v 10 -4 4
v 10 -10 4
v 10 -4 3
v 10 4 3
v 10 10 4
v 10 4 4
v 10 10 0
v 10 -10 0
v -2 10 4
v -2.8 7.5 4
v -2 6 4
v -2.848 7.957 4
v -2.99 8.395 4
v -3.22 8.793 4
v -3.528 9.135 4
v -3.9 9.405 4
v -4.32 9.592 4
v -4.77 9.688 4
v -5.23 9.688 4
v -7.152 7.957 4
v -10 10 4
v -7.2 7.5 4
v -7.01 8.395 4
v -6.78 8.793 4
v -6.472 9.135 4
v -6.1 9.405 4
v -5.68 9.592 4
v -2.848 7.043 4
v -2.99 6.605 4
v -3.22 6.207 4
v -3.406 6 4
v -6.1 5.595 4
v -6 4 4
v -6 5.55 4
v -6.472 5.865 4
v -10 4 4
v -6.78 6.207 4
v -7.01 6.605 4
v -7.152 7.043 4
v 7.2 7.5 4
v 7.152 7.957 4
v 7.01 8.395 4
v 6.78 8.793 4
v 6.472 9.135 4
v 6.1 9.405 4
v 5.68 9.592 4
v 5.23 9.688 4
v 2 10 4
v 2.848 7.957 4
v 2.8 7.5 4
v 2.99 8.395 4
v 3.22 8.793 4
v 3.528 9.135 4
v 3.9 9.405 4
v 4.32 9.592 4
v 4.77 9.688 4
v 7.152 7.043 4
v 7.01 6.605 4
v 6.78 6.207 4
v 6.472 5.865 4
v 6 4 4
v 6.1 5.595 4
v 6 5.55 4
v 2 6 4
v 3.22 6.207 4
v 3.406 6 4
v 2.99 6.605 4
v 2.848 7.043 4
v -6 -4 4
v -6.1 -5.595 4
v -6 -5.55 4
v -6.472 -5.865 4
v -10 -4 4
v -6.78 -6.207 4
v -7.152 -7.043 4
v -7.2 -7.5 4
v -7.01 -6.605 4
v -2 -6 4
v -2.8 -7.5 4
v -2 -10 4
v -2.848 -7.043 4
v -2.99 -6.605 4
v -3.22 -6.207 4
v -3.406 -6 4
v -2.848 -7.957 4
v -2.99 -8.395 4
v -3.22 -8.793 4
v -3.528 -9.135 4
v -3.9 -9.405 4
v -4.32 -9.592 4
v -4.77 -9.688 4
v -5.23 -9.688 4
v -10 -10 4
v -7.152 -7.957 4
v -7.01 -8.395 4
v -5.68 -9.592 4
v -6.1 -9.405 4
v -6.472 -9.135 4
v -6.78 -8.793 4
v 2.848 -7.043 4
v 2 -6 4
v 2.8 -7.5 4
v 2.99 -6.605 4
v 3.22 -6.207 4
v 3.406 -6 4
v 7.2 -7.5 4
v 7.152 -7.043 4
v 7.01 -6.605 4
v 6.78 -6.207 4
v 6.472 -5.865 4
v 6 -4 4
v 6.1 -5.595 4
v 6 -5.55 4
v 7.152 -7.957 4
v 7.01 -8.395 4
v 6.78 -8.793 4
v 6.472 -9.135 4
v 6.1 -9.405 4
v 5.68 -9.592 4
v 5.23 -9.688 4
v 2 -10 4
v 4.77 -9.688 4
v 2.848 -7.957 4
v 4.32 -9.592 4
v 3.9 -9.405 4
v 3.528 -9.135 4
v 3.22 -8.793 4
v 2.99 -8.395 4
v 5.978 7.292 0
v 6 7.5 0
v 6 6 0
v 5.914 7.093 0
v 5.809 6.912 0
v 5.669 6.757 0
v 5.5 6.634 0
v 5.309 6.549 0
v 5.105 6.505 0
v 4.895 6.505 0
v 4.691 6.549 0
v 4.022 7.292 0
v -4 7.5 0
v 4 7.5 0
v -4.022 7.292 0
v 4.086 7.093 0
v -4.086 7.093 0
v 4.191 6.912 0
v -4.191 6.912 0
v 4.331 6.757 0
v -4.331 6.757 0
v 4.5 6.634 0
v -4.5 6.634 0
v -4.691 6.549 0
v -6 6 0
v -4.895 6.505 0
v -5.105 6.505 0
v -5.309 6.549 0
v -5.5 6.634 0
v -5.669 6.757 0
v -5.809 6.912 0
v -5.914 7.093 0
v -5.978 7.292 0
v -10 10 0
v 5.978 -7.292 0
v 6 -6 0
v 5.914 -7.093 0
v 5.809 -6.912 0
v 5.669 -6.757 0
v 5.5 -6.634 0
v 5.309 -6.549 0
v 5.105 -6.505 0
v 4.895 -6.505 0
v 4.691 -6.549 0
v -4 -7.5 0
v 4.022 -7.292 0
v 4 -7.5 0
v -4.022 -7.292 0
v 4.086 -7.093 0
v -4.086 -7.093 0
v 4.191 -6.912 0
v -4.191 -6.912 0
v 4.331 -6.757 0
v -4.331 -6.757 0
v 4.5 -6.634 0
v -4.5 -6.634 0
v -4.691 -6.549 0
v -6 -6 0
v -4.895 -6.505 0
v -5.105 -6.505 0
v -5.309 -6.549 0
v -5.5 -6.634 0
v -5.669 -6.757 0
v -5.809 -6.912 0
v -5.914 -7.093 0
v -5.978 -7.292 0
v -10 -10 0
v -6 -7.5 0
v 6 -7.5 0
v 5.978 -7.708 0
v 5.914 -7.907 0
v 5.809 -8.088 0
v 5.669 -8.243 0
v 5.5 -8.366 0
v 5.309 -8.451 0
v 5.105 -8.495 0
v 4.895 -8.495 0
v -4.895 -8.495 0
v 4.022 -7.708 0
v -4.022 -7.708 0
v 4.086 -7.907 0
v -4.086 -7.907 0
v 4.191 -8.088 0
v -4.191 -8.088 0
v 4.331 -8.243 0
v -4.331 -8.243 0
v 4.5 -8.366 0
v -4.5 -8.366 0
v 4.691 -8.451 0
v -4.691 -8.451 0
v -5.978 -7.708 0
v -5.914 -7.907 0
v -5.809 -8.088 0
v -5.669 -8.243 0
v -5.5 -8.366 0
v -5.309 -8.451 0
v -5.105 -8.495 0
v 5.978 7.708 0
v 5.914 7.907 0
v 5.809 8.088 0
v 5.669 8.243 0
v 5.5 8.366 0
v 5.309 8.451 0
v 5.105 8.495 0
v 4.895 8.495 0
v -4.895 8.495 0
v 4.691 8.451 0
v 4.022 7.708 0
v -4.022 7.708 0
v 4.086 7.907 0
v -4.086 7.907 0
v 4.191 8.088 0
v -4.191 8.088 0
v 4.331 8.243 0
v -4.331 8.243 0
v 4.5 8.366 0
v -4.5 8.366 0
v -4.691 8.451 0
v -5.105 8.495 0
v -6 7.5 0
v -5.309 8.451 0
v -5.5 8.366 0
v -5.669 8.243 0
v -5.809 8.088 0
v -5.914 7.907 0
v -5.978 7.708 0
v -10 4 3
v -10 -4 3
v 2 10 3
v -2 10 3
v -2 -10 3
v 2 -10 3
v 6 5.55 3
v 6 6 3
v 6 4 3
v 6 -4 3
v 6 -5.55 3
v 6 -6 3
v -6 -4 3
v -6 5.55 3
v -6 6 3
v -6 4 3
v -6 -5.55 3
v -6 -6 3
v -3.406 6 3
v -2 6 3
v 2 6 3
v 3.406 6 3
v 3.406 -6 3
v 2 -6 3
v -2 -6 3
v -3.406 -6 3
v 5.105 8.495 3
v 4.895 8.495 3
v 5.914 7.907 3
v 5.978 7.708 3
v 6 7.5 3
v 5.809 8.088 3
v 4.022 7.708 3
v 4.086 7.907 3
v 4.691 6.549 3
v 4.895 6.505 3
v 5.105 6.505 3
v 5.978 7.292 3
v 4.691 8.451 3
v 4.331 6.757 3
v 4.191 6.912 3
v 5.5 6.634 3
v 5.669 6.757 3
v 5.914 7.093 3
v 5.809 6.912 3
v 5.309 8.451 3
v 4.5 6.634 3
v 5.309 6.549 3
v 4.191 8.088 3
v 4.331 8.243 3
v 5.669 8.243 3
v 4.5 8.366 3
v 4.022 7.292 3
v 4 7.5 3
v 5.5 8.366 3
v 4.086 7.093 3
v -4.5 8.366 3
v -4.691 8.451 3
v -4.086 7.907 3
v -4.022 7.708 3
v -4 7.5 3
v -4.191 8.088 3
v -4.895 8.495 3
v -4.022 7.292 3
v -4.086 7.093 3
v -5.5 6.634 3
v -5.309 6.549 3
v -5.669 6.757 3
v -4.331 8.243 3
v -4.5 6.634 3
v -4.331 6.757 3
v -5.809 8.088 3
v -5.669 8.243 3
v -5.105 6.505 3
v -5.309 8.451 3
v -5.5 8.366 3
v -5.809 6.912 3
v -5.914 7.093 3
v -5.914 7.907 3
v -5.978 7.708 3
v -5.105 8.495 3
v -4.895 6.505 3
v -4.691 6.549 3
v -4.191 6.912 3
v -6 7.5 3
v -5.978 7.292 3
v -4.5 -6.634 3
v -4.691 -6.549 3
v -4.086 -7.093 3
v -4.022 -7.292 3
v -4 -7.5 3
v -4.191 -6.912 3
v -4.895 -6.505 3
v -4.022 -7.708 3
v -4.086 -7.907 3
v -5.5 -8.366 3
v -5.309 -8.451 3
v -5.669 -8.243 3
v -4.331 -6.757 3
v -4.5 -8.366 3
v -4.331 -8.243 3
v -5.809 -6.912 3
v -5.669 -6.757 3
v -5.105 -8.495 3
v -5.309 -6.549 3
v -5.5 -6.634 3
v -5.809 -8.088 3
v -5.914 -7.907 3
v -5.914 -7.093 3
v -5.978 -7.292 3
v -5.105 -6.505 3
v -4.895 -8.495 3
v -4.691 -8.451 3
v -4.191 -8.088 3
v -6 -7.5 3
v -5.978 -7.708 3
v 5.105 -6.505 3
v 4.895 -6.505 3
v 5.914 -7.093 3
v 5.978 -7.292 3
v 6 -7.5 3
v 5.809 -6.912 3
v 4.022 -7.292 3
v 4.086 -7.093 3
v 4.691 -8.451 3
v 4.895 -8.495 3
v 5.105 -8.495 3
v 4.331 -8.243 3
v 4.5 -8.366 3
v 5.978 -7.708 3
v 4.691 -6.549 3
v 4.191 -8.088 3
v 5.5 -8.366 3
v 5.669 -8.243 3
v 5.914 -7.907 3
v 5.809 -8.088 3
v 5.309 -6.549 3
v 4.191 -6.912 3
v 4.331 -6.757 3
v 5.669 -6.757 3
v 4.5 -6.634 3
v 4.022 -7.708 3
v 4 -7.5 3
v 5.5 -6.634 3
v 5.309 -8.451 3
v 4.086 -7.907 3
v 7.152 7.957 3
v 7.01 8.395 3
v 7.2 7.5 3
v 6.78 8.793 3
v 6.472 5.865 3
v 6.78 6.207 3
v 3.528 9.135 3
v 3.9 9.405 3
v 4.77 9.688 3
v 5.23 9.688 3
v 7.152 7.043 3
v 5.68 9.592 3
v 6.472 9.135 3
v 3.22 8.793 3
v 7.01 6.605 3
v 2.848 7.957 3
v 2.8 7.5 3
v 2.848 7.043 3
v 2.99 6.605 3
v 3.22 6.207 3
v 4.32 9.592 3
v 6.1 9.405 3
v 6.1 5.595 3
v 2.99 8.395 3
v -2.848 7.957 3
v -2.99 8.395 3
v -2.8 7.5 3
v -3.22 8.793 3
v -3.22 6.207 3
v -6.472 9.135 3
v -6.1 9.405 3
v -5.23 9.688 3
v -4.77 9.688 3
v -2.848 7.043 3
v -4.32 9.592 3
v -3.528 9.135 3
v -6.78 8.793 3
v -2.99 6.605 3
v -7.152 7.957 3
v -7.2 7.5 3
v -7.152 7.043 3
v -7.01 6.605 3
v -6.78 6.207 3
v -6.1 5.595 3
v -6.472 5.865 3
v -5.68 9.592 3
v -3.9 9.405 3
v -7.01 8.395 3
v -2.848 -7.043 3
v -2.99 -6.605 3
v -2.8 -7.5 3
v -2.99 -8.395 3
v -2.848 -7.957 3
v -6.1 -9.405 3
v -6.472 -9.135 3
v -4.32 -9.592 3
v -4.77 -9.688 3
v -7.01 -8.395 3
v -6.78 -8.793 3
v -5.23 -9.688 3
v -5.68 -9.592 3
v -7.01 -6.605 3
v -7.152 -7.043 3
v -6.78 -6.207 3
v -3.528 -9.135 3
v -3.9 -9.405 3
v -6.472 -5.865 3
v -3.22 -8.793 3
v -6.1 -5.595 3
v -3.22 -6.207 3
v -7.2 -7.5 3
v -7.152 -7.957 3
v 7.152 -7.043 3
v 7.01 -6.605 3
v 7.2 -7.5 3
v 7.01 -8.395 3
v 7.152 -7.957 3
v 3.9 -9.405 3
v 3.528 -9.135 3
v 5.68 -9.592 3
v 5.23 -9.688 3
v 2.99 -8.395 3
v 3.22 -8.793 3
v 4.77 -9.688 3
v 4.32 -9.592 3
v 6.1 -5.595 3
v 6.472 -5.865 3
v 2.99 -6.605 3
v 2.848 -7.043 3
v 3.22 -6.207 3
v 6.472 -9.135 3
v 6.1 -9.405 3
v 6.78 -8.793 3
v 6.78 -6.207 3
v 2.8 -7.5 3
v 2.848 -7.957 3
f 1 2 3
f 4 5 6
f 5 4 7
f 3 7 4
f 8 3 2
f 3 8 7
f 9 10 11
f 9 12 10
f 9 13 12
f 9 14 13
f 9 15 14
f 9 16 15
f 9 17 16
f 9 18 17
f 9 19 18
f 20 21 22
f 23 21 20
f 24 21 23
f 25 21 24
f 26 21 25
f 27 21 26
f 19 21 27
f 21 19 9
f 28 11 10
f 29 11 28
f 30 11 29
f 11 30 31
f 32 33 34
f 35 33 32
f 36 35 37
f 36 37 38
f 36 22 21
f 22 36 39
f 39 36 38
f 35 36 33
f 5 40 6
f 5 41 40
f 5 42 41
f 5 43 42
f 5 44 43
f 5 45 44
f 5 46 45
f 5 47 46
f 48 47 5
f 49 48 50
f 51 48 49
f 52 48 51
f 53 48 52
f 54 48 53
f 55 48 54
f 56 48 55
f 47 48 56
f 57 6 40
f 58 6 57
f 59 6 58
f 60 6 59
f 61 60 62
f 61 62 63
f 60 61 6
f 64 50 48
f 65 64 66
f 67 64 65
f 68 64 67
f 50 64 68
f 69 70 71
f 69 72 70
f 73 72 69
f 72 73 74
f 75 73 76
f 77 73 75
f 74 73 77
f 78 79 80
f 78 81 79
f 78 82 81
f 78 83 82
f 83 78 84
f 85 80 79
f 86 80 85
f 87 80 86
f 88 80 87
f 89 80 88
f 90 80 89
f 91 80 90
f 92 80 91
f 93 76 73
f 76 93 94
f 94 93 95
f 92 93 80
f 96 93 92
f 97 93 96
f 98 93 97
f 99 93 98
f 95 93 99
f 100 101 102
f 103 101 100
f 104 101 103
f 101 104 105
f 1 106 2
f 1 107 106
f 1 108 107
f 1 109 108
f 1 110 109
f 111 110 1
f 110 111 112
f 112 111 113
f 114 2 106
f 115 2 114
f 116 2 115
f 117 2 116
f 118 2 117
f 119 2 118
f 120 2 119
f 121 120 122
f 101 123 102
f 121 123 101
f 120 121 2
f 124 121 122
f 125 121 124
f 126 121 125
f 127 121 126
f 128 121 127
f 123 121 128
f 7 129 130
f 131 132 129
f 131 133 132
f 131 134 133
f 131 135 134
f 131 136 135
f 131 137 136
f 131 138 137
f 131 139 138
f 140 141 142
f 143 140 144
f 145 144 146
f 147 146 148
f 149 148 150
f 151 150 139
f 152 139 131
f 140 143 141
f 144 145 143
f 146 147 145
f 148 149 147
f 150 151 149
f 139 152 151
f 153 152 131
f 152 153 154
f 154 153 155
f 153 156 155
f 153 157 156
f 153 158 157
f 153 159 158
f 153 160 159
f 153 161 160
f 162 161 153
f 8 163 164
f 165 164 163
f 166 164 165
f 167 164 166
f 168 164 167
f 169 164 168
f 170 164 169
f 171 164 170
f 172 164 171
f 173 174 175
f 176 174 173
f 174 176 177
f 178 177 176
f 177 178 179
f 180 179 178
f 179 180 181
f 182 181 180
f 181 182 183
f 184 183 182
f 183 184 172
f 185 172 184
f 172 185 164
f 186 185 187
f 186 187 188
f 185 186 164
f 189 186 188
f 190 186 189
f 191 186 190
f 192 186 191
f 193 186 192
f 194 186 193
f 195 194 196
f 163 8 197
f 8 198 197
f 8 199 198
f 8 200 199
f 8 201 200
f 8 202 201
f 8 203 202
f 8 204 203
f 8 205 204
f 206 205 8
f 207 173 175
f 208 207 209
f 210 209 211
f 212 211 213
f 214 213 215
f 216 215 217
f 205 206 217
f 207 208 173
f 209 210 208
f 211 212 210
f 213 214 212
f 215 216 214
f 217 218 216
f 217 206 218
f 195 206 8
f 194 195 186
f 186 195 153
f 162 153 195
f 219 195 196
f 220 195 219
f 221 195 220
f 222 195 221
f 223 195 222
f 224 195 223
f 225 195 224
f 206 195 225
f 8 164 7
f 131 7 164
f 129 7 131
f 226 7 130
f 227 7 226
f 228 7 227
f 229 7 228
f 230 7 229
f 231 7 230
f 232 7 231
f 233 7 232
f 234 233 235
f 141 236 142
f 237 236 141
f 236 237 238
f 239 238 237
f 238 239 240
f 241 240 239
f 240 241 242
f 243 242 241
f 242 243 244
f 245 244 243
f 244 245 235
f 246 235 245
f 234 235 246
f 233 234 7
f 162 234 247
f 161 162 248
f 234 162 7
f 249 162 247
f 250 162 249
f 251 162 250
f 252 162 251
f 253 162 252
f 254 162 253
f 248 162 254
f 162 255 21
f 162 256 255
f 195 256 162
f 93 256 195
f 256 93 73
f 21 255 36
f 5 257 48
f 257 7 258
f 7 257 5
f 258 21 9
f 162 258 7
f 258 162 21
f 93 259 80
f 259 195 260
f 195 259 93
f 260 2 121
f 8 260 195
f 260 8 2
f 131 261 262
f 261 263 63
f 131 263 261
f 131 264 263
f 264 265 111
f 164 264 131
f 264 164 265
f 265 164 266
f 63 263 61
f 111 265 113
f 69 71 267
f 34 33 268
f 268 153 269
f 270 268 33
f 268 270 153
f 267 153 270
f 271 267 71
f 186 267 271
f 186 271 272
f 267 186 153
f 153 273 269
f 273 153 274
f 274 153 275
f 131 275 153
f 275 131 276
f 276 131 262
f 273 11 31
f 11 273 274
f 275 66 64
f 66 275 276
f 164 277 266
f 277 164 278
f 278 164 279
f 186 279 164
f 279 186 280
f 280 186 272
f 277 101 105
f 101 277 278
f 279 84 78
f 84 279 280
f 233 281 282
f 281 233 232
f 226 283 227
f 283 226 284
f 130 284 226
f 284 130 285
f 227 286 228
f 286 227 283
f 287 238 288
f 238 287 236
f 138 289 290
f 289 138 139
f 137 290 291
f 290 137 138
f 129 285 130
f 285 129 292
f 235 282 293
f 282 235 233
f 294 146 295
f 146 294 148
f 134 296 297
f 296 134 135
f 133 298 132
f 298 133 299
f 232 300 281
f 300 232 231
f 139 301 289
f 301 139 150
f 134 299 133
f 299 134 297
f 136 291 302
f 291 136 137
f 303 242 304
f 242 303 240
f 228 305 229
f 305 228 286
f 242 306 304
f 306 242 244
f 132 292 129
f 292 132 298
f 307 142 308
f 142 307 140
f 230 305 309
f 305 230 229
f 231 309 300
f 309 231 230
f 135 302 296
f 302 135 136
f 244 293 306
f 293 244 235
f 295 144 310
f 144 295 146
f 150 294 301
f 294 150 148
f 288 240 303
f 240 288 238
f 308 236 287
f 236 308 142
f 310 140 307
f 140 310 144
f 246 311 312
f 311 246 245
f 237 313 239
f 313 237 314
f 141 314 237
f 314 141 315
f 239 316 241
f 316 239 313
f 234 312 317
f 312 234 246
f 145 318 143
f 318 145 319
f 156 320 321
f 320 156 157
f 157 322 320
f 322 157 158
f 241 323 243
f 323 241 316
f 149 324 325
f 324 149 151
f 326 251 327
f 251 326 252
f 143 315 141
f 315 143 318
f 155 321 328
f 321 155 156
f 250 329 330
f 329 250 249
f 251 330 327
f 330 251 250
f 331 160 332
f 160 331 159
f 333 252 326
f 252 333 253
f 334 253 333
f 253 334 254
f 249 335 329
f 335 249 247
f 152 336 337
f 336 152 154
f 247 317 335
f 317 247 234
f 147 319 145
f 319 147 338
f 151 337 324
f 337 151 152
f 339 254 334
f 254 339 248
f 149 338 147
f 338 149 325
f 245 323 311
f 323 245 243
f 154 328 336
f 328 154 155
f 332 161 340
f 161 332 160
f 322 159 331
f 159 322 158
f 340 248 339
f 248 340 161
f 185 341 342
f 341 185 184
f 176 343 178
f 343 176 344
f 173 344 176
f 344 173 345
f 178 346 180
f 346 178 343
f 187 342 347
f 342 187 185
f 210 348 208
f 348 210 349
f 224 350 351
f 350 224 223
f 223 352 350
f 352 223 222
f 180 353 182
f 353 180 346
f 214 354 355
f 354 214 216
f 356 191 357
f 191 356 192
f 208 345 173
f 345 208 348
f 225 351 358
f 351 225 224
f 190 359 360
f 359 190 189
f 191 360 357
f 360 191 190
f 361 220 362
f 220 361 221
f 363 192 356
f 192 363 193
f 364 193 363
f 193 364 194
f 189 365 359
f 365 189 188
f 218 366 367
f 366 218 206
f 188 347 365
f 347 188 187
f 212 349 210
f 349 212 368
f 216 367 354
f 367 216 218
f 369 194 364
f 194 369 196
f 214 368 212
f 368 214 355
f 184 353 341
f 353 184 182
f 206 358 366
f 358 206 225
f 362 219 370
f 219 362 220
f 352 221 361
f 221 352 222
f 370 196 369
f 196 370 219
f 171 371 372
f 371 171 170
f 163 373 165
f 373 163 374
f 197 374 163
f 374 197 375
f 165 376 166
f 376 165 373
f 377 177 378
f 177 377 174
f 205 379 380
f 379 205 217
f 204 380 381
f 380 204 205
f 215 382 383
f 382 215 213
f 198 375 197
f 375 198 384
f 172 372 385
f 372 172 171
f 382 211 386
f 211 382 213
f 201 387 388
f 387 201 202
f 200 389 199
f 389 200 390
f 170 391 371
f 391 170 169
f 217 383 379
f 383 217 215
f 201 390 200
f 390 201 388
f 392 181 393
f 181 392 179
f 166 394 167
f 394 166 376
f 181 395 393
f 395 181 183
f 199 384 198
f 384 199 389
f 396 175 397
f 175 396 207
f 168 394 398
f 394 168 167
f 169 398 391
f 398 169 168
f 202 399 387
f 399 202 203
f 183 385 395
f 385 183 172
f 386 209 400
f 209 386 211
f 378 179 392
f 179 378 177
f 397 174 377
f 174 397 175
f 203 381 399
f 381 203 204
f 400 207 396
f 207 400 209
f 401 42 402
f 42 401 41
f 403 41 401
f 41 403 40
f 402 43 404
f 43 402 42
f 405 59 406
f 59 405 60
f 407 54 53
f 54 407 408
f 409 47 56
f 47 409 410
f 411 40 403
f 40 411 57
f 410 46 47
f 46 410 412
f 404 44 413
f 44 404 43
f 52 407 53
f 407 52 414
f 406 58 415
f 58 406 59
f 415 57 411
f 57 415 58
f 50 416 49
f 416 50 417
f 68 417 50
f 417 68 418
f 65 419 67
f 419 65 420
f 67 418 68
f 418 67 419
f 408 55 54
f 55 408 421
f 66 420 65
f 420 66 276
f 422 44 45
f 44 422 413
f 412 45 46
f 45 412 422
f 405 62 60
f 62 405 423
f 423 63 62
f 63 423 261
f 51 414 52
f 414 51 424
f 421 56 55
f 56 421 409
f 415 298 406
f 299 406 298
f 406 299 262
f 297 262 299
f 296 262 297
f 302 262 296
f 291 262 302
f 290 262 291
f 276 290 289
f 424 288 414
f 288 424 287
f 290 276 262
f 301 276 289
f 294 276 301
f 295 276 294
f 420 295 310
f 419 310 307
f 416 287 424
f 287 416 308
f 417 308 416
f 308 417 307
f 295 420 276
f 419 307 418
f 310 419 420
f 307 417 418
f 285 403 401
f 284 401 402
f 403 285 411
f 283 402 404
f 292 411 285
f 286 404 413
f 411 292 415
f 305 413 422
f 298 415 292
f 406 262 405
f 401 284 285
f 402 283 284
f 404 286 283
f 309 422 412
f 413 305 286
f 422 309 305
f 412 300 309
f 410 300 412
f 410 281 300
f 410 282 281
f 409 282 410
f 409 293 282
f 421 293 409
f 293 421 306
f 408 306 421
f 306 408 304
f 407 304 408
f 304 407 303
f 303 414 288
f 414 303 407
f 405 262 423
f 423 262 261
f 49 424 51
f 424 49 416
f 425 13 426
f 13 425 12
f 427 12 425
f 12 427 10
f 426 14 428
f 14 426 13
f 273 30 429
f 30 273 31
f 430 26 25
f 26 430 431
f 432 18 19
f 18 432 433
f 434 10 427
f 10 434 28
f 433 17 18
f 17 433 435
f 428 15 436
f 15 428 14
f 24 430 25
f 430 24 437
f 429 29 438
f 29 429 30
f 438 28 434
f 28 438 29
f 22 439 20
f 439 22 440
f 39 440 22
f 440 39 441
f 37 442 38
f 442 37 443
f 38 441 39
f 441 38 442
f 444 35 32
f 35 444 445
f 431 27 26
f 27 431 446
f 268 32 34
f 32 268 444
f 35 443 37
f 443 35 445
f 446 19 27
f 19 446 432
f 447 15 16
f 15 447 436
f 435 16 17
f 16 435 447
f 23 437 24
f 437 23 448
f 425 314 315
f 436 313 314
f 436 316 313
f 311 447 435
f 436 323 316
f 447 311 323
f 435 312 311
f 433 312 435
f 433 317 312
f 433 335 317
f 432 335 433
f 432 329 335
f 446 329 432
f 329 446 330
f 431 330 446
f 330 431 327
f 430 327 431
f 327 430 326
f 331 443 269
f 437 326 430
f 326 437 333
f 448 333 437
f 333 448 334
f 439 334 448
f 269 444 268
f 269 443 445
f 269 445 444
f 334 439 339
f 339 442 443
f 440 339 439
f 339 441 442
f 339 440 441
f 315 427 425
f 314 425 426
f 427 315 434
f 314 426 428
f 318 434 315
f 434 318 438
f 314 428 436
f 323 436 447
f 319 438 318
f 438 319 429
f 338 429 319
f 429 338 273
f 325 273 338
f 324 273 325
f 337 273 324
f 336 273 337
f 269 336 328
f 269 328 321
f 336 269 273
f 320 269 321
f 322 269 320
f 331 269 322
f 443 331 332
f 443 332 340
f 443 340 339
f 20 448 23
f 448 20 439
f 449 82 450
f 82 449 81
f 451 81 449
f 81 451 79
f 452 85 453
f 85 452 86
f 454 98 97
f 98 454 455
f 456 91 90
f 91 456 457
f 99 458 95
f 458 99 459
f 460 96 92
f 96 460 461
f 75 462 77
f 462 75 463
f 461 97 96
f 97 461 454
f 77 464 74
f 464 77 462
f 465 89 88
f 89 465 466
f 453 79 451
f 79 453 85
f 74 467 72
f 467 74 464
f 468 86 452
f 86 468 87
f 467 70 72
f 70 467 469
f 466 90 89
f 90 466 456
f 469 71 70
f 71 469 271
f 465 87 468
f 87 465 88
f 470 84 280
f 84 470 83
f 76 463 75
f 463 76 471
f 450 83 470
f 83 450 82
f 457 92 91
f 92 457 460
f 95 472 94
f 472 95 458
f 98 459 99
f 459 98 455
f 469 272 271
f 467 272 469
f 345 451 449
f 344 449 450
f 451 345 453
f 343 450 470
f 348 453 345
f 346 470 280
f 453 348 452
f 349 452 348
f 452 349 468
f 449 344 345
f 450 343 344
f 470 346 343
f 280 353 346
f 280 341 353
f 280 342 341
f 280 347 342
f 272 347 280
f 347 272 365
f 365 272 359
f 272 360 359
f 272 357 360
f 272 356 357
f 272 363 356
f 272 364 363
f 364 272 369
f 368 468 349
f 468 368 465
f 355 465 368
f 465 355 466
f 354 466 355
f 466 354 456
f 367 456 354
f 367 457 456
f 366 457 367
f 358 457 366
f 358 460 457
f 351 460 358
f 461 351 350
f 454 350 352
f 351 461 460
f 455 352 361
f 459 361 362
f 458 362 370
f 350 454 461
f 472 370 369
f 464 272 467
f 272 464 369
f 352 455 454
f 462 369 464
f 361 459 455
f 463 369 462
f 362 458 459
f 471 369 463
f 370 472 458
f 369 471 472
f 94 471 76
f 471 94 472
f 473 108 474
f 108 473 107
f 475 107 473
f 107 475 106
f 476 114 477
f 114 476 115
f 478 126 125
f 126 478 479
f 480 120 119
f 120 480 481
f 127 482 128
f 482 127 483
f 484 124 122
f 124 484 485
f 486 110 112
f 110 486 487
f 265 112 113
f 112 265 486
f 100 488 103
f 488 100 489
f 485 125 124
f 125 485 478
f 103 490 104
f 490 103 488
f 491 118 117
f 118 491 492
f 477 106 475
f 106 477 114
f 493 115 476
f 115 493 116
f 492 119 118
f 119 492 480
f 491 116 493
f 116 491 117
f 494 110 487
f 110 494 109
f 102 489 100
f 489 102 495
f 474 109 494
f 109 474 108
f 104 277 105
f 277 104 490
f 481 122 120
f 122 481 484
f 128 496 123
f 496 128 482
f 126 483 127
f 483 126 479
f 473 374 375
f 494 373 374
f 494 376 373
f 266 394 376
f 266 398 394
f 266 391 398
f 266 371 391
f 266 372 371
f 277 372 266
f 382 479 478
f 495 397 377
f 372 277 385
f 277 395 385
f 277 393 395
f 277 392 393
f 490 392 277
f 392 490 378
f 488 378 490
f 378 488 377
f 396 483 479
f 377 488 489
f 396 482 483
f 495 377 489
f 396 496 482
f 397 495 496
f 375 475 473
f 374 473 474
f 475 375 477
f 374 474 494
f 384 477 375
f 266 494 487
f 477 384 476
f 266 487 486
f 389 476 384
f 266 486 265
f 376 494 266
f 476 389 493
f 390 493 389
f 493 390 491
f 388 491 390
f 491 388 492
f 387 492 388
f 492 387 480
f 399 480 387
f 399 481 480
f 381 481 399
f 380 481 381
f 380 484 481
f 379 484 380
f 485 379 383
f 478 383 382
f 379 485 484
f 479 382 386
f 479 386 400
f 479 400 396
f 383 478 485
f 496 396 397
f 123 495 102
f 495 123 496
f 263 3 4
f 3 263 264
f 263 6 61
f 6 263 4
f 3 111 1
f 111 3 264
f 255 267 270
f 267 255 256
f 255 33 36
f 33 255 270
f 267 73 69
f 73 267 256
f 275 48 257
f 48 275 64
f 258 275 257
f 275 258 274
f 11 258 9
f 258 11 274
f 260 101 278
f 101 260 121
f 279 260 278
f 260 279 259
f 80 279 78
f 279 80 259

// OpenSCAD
// circle control
$fs = 0.2;

// dimensions
h=4;

ledw=10;
ledh=15;
ledd=2.0;

swh=12;
sww=12;

pinw=5;
pinh=8;


difference(){
    translate([0,0,h/2]) cube([20, 20, h], true);
    translate([0,0,h/2]) cube([swh, sww, h*2], true);
    translate([5,ledh/2,h/2]) cylinder(h=h*2, r= ledd/2, center=true);
    translate([-5,ledh/2,h/2]) cylinder(h=h*2, r= ledd/2, center=true);
    translate([-5,-ledh/2,h/2]) cylinder(h=h*2, r= ledd/2, center=true);
    translate([5,-ledh/2,h/2]) cylinder(h=h*2, r= ledd/2, center=true);

    translate([5,ledh/2,h]) cylinder(h=2, r= ledd/2+1.2, center=true);
    translate([-5,ledh/2,h]) cylinder(h=2, r= ledd/2+1.2, center=true);
    translate([-5,-ledh/2,h]) cylinder(h=2, r= ledd/2+1.2, center=true);
    translate([5,-ledh/2,h]) cylinder(h=2, r= ledd/2+1.2, center=true);

    translate([pinh,0,h]) cube([pinw, pinh, 2], true);
    translate([-pinh,0,h]) cube([pinw, pinh, 2], true);
    translate([0,pinh,h]) cube([4, 4.5, 2], true);
    translate([0,-pinh,h]) cube([4, 4.5, 2], true);
}
